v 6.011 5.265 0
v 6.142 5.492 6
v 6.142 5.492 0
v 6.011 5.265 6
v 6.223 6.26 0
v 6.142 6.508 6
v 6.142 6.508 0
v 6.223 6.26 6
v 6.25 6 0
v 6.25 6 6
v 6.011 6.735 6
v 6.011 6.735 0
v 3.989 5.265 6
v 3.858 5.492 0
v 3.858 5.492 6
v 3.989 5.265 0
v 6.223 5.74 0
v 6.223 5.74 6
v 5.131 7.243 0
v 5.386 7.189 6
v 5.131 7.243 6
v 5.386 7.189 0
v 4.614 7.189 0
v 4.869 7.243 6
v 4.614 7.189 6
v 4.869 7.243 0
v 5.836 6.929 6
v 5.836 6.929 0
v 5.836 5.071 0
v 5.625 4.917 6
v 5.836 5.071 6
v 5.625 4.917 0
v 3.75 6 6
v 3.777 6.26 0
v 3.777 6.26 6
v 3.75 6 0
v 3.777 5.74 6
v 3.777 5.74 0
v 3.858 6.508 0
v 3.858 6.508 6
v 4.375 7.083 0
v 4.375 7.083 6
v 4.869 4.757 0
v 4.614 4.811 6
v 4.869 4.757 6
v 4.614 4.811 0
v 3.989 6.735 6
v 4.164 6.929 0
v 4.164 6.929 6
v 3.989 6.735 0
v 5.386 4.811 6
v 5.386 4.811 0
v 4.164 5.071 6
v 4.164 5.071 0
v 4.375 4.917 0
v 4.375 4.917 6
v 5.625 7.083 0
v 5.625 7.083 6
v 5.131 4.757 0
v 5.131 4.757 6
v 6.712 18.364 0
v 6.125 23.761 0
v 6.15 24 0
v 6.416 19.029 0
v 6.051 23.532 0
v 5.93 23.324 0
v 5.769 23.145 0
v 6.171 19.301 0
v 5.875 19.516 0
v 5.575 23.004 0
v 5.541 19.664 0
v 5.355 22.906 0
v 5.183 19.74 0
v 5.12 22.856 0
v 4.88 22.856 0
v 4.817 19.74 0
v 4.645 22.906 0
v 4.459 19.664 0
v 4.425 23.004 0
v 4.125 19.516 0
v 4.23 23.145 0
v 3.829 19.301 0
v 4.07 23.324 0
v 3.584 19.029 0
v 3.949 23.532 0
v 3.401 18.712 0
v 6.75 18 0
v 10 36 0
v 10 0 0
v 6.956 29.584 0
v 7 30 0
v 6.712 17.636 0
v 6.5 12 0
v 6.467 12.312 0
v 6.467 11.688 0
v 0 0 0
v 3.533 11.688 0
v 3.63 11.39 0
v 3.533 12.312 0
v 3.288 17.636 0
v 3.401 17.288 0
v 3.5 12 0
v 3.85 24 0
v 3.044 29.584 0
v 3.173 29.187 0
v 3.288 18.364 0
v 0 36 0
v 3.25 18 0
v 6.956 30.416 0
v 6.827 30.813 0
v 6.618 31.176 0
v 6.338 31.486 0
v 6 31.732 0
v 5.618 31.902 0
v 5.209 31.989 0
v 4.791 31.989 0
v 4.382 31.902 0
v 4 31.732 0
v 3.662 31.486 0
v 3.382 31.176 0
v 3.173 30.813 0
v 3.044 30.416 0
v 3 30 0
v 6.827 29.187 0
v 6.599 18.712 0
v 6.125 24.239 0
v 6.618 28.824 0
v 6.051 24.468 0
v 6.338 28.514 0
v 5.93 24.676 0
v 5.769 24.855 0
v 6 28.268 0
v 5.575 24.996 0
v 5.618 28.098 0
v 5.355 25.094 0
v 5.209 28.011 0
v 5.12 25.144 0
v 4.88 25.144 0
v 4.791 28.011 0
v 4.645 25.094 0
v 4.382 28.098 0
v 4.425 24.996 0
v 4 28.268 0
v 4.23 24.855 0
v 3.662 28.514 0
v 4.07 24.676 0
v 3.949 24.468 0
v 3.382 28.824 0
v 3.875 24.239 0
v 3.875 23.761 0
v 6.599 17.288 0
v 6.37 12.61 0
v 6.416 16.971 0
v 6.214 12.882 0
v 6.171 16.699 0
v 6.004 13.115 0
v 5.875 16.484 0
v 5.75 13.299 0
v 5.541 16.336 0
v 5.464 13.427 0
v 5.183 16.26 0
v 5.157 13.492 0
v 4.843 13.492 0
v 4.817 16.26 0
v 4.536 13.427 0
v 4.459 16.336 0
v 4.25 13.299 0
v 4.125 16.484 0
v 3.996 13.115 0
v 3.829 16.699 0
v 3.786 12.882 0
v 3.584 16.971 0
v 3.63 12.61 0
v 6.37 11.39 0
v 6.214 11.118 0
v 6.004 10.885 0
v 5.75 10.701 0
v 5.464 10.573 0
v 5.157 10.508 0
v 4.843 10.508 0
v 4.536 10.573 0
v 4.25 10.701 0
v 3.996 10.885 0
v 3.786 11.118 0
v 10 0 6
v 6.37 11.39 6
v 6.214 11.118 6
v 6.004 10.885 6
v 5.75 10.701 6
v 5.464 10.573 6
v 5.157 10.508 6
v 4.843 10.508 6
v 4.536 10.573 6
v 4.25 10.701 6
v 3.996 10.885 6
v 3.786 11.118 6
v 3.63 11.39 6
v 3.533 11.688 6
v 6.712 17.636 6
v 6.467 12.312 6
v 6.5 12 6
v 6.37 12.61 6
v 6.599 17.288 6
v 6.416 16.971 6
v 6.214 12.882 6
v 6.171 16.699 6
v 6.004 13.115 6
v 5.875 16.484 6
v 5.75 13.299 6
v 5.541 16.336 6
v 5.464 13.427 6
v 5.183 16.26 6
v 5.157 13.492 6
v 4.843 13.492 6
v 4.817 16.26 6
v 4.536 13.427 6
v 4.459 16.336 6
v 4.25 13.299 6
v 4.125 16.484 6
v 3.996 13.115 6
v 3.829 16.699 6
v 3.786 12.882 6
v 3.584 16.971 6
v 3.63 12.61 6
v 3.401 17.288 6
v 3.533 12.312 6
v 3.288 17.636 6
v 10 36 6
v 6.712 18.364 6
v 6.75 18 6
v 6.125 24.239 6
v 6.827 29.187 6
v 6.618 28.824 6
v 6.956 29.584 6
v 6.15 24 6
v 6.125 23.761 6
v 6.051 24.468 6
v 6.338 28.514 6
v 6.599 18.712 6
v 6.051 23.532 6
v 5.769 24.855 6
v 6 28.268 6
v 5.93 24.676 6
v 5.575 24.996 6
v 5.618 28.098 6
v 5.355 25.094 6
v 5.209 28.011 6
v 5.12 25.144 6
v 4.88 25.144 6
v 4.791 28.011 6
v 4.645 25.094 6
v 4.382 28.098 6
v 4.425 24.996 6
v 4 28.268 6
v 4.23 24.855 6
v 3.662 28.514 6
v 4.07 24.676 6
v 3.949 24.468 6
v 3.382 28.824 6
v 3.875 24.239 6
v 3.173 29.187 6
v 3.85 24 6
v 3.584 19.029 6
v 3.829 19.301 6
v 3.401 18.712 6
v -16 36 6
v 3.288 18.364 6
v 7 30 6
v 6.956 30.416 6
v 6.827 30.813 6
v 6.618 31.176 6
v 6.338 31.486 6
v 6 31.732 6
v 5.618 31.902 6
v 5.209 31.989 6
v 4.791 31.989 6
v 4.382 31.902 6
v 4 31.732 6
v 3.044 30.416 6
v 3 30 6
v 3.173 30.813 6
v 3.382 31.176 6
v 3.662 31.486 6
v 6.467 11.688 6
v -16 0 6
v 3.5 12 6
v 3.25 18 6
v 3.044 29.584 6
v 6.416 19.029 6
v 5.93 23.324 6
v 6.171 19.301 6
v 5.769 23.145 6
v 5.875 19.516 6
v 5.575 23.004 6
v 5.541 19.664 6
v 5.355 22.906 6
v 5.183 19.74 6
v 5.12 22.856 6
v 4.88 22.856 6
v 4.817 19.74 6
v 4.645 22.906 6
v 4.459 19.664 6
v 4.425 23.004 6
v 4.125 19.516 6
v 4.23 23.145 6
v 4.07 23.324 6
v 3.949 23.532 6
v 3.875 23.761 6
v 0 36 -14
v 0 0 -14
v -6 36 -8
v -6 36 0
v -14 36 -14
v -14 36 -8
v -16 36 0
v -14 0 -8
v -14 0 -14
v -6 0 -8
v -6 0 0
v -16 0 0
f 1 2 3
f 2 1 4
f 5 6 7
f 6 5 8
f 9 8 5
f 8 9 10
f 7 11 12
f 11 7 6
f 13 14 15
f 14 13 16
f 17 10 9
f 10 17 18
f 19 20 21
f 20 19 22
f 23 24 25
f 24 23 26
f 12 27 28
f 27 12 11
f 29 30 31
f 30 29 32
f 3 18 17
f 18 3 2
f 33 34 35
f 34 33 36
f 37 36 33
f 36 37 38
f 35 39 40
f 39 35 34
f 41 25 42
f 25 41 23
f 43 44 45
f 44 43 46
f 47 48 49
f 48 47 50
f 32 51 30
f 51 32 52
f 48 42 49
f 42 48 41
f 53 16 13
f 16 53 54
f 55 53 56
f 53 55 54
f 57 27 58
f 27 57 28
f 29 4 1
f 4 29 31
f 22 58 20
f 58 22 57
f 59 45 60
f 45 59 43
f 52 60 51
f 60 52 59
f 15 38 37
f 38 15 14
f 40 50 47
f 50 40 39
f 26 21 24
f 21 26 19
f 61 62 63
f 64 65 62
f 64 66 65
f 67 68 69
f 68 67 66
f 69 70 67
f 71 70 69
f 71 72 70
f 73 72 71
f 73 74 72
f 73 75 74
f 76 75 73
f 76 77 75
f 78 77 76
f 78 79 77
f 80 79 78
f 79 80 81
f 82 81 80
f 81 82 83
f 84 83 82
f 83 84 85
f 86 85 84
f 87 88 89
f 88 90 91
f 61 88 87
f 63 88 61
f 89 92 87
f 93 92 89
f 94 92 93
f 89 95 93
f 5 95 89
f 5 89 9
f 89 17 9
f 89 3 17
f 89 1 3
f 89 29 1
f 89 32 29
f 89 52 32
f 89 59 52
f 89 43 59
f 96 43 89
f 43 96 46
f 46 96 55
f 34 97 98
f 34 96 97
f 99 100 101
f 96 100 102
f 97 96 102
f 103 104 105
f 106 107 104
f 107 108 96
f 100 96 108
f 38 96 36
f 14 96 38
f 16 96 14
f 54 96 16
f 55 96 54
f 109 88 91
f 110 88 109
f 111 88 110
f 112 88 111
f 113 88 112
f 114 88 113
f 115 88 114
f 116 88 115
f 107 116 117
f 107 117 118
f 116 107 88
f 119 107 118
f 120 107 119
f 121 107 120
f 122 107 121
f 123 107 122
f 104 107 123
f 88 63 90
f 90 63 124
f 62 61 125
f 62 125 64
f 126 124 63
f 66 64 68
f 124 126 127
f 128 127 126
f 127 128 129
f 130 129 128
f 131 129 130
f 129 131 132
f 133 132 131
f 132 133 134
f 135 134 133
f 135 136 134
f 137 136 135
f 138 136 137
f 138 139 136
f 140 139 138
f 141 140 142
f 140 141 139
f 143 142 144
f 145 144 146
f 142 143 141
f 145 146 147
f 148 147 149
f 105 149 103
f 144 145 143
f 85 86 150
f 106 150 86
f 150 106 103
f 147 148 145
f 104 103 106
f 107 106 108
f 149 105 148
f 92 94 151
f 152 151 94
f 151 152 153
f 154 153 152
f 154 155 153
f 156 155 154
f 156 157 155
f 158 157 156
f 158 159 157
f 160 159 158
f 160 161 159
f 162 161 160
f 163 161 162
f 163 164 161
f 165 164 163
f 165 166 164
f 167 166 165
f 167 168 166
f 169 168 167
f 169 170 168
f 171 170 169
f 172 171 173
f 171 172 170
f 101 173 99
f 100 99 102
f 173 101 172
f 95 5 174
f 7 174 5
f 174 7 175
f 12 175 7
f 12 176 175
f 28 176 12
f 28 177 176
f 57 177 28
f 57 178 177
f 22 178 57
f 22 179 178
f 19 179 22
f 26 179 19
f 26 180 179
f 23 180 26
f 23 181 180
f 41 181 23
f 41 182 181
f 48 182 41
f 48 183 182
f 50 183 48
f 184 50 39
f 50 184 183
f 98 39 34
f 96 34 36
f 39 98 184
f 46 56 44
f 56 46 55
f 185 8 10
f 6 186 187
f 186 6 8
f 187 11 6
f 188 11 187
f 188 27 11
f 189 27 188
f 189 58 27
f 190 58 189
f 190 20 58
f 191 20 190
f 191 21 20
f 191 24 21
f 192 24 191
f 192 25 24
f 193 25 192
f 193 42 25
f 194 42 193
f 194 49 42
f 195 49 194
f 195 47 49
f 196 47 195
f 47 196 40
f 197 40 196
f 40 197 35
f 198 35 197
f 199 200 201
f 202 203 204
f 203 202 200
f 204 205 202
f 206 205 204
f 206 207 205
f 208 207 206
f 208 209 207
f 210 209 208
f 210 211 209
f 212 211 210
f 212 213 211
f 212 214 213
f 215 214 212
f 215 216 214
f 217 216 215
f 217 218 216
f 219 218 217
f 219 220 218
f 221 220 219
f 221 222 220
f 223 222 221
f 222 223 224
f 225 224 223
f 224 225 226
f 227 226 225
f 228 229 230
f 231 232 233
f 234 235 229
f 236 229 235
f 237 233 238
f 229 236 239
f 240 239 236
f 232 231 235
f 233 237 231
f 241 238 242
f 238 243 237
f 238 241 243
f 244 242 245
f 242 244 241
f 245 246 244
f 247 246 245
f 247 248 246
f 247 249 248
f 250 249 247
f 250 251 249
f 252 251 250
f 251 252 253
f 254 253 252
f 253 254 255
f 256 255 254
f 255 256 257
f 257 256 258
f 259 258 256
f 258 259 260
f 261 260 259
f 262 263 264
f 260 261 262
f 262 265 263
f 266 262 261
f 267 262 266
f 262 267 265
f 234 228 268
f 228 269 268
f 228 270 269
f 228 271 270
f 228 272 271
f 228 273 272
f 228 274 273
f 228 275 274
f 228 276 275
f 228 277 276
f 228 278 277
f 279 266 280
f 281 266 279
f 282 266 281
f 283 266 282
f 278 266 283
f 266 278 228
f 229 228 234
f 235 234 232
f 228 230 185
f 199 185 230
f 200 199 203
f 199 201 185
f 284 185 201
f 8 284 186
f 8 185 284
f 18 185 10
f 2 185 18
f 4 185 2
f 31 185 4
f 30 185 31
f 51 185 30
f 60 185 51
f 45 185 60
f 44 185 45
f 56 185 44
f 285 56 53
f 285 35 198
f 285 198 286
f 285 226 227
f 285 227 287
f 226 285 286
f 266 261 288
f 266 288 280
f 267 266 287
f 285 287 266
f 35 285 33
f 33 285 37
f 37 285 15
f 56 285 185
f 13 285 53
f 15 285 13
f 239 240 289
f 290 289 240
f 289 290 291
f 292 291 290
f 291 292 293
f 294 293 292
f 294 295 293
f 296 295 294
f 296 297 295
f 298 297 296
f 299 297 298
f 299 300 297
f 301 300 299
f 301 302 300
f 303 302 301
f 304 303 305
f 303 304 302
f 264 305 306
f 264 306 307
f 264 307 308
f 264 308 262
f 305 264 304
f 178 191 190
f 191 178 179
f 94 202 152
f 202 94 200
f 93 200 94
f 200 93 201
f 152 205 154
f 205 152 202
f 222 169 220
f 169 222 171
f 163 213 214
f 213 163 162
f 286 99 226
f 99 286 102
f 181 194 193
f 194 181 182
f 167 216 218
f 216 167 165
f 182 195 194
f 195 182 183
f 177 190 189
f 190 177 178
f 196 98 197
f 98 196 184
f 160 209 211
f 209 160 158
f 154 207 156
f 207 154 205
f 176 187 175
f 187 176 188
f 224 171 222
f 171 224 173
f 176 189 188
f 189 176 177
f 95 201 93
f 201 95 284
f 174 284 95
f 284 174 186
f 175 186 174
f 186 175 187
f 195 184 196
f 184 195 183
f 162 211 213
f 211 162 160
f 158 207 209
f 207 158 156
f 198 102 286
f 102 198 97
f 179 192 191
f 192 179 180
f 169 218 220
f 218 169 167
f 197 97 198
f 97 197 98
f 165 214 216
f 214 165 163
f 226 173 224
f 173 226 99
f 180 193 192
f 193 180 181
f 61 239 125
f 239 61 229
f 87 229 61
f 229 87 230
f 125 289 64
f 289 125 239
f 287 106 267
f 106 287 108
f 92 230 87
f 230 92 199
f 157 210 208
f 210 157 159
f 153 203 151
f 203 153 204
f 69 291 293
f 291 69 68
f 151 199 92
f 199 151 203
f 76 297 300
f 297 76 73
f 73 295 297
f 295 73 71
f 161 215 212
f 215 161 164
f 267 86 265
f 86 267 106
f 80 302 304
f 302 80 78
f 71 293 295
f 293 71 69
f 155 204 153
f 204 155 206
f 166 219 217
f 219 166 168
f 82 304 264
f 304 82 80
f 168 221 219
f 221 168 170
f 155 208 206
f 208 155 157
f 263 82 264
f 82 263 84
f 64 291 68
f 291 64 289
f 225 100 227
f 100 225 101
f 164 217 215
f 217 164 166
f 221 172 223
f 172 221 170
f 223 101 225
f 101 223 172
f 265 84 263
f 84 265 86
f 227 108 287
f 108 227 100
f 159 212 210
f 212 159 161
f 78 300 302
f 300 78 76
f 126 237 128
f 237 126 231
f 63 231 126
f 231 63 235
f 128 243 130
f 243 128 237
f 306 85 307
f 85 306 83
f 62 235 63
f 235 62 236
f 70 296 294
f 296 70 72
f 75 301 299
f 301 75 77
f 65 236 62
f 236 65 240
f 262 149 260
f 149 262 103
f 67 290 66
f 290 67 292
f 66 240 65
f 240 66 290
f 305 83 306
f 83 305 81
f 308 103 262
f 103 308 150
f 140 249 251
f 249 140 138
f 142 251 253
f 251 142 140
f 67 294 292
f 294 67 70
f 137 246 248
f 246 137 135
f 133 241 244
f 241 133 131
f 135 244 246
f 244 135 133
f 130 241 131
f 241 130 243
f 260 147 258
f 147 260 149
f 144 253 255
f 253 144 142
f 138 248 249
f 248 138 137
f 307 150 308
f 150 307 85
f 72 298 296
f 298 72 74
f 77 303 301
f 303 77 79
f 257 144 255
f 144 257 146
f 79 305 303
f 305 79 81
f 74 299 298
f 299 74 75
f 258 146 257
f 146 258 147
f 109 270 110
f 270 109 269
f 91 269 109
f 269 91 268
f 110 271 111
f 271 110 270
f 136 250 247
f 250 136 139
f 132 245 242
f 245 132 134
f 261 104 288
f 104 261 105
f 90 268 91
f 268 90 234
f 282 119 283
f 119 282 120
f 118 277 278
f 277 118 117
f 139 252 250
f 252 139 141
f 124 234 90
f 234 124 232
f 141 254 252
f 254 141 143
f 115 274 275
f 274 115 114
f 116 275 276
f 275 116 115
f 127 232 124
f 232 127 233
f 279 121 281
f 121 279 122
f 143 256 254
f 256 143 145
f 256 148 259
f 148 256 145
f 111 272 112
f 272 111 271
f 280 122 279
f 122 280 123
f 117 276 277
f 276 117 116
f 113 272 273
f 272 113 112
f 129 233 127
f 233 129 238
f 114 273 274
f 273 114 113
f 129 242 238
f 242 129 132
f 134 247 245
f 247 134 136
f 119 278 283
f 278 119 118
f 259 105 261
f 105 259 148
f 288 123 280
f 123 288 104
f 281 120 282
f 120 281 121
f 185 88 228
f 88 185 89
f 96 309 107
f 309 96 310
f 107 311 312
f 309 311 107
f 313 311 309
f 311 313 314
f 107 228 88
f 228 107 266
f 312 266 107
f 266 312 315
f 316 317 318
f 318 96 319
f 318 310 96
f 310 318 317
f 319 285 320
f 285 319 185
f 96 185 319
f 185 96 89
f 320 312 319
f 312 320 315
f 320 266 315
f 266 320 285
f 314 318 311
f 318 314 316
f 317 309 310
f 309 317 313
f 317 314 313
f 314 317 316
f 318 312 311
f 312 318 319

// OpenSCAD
d = [2.5,3,3.5,2.3,4]; 
thickness = 6;
thicknessBoard = 8;
overUp = 10;
overDown = 8;
attachment = "H";// H or V

dn = len(d);
dMax = max(d);

width = (dMax + 2) * 6; 
breit = dMax + 6;


difference(){
    cube([breit, width ,thickness]);
    
    for (i = [0 : dn - 1])
    {
        translate([breit/2, (width/(dn+1))* (i + 1) ,0])
            cylinder(d = d[i], h = thickness, $fn=30);
    }
}

if (attachment == "H") 
{
translate([-(overUp + thickness),0,0])
    cube([overUp + thickness, width ,thickness]);

translate([- (overDown + thickness),0,-(thickness+thicknessBoard)])
    cube([overDown + thickness, width ,thickness]);

translate([-(thickness),0,-(thicknessBoard)])
    cube([thickness, width ,thicknessBoard]);
}
if (attachment == "V") 
{
translate([-thickness,0,-overDown])
    cube([ thickness, width ,overDown + thickness]);

translate([-(2*thickness + thicknessBoard),0,-overUp])
    cube([ thickness, width ,overUp + thickness]);
translate([-(thickness + thicknessBoard),0,0])    
    cube([thicknessBoard, width ,thickness]);

}

